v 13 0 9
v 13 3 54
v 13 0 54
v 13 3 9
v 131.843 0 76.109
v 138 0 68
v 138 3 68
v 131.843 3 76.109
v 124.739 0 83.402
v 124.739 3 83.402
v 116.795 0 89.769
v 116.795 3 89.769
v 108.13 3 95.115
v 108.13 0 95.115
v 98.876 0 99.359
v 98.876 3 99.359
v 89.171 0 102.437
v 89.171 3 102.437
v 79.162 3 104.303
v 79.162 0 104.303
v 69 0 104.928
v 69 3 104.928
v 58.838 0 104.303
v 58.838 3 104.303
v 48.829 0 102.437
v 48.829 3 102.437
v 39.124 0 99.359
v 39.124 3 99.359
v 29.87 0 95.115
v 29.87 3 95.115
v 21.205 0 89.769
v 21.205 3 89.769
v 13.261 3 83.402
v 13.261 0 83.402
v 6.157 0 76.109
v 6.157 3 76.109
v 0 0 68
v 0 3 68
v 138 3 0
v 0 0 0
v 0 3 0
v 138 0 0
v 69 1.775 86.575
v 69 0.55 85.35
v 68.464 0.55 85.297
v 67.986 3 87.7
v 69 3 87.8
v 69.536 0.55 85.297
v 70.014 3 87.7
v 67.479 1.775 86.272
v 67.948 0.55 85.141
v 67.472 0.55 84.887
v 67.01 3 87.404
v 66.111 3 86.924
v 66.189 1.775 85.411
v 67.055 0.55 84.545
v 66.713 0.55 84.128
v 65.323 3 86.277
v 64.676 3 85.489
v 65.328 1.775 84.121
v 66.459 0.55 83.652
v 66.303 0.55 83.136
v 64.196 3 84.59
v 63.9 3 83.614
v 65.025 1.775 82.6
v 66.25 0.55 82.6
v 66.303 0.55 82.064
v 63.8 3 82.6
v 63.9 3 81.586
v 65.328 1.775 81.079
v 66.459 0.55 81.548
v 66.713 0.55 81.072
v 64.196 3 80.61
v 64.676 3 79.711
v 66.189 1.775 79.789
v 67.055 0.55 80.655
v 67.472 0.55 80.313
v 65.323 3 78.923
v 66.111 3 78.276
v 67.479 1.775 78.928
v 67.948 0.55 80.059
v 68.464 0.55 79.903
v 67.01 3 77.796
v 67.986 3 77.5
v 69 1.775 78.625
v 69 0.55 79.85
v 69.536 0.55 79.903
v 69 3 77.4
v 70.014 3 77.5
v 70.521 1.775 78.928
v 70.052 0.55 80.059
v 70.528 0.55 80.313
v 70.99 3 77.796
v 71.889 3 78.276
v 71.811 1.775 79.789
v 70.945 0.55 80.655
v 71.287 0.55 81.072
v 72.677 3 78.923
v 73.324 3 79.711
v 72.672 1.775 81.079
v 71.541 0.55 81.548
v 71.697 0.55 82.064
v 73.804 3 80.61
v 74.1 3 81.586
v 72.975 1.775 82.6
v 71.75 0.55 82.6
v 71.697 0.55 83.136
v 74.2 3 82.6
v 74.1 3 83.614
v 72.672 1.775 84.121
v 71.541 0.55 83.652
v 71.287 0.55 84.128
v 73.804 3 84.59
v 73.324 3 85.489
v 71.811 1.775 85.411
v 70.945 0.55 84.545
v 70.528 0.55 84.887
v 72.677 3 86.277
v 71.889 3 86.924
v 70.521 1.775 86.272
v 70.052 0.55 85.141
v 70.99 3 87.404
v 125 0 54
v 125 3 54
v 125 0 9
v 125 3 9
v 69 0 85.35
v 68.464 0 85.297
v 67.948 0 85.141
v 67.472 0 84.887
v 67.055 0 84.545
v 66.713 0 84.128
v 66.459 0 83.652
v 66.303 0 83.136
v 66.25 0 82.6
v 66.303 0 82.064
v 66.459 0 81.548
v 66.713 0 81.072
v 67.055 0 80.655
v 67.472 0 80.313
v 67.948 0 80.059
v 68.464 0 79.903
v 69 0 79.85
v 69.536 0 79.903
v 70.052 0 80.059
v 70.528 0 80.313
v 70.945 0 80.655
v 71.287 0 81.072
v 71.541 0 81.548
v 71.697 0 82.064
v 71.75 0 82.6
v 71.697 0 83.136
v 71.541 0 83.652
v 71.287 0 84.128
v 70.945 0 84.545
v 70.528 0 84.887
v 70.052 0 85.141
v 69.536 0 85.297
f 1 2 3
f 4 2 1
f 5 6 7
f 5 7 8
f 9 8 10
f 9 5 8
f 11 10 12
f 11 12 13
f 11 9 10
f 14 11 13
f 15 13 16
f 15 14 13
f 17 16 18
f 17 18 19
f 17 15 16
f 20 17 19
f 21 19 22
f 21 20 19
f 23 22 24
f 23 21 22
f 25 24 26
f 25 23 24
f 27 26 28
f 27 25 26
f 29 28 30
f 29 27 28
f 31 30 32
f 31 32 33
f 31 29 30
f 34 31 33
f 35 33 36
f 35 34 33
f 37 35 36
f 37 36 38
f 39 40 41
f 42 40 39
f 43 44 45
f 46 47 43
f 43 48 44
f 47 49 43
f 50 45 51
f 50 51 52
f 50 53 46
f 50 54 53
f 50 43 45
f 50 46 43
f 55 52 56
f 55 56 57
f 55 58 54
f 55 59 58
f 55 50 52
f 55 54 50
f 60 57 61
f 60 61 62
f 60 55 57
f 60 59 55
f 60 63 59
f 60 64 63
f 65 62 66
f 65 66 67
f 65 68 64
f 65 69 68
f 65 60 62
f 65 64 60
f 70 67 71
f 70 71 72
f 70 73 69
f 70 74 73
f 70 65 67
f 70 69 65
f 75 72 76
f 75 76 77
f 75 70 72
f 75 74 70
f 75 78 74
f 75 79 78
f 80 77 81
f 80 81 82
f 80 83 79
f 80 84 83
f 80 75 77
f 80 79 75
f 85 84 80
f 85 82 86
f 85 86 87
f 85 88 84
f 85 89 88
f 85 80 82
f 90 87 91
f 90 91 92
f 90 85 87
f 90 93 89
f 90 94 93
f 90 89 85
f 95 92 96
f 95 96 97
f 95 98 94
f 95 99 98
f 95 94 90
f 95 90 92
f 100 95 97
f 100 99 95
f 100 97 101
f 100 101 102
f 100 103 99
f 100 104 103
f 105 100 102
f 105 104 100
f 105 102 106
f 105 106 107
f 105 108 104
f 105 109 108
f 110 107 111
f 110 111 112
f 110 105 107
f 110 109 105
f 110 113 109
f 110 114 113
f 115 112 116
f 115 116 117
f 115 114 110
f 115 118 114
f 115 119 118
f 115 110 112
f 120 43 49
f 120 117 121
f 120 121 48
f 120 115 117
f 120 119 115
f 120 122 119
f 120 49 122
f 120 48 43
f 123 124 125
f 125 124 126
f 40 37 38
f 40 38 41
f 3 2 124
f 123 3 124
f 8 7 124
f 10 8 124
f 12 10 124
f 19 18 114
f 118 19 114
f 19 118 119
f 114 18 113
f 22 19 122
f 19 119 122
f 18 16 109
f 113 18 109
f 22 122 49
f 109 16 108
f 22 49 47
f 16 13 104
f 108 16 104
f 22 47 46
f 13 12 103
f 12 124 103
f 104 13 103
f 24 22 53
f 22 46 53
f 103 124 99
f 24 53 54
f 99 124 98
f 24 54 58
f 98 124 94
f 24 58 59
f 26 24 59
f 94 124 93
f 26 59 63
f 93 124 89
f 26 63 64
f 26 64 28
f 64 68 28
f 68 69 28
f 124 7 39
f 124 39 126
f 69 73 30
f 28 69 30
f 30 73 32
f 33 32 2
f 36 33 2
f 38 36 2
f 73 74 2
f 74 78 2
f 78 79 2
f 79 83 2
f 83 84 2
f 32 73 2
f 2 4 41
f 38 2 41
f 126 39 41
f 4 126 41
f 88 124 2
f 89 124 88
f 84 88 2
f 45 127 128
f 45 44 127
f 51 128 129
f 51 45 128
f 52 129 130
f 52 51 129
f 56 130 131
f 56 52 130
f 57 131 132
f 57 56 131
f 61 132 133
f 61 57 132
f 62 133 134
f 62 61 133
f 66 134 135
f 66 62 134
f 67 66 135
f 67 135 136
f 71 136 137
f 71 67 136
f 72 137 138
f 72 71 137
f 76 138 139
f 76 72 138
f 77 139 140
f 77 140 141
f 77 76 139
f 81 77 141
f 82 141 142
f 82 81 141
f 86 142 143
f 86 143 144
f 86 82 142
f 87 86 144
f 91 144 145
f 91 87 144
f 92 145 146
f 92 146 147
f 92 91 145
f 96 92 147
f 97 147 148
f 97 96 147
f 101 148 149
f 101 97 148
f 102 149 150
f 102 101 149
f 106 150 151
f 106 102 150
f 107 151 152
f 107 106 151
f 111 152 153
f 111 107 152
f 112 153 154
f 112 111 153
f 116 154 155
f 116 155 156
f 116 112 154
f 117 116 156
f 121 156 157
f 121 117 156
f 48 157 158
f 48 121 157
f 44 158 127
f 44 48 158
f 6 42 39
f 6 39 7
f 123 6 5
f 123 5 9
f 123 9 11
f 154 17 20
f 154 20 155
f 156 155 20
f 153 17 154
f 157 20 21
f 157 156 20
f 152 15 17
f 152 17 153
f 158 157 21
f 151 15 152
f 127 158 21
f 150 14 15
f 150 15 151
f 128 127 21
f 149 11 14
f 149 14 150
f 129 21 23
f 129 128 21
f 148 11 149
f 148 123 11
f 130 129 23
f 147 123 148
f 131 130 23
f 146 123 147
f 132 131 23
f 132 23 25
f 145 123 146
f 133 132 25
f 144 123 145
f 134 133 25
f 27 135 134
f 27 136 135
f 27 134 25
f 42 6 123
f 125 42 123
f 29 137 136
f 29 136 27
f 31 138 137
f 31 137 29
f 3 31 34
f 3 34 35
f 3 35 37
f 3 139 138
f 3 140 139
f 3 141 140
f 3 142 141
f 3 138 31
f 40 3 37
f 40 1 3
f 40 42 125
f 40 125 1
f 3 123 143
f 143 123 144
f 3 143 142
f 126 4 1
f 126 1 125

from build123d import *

# Parameters (mm, degrees)
EXTRUDE_1_DEPTH     = 3
SKETCH_2_W          = 112
SKETCH_2_H          = 45
CUT_EXTRUDE_1_DEPTH = 174.386325559


with BuildPart() as part:
    # Эскиз1 → Бобышка-Вытянуть1 (new body)
    with BuildSketch(Plane(origin=(0, 0, 0), x_dir=(1, 0, 0), z_dir=(0, 1, 0))):
        with BuildLine():
            Line((0, 0), (138, 0))
            Line((138, 0), (138, -68))
            ThreePointArc((138, -68), (69, -104.927679336), (0, -68))
            Line((0, -68), (0, 0))
        make_face()
    extrude(amount=EXTRUDE_1_DEPTH)

    # Эскиз2 → Вырез-Вытянуть1 (cut, through all)
    with BuildSketch(Plane(origin=(0, 3, 0), x_dir=(1, 0, 0), z_dir=(0, 1, 0))):
        with Locations((69, -31.5)):
            Rectangle(SKETCH_2_W, SKETCH_2_H)
    extrude(amount=-CUT_EXTRUDE_1_DEPTH, mode=Mode.SUBTRACT)

    # Эскиз3 → Зенковка для  винта с плоской головкой M51 (revolve, cut)
    with BuildSketch(Plane(origin=(69, 3, 82.6), x_dir=(0, 0, 1), z_dir=(1, 0, 0))):
        Polygon((0, 0), (0, 3), (2.75, 3), (2.75, 2.45), (5.2, 0), align=None)
    revolve(axis=Axis((69, 9.35, 82.6), (0, -1, 0)), mode=Mode.SUBTRACT)


solid = part.part
